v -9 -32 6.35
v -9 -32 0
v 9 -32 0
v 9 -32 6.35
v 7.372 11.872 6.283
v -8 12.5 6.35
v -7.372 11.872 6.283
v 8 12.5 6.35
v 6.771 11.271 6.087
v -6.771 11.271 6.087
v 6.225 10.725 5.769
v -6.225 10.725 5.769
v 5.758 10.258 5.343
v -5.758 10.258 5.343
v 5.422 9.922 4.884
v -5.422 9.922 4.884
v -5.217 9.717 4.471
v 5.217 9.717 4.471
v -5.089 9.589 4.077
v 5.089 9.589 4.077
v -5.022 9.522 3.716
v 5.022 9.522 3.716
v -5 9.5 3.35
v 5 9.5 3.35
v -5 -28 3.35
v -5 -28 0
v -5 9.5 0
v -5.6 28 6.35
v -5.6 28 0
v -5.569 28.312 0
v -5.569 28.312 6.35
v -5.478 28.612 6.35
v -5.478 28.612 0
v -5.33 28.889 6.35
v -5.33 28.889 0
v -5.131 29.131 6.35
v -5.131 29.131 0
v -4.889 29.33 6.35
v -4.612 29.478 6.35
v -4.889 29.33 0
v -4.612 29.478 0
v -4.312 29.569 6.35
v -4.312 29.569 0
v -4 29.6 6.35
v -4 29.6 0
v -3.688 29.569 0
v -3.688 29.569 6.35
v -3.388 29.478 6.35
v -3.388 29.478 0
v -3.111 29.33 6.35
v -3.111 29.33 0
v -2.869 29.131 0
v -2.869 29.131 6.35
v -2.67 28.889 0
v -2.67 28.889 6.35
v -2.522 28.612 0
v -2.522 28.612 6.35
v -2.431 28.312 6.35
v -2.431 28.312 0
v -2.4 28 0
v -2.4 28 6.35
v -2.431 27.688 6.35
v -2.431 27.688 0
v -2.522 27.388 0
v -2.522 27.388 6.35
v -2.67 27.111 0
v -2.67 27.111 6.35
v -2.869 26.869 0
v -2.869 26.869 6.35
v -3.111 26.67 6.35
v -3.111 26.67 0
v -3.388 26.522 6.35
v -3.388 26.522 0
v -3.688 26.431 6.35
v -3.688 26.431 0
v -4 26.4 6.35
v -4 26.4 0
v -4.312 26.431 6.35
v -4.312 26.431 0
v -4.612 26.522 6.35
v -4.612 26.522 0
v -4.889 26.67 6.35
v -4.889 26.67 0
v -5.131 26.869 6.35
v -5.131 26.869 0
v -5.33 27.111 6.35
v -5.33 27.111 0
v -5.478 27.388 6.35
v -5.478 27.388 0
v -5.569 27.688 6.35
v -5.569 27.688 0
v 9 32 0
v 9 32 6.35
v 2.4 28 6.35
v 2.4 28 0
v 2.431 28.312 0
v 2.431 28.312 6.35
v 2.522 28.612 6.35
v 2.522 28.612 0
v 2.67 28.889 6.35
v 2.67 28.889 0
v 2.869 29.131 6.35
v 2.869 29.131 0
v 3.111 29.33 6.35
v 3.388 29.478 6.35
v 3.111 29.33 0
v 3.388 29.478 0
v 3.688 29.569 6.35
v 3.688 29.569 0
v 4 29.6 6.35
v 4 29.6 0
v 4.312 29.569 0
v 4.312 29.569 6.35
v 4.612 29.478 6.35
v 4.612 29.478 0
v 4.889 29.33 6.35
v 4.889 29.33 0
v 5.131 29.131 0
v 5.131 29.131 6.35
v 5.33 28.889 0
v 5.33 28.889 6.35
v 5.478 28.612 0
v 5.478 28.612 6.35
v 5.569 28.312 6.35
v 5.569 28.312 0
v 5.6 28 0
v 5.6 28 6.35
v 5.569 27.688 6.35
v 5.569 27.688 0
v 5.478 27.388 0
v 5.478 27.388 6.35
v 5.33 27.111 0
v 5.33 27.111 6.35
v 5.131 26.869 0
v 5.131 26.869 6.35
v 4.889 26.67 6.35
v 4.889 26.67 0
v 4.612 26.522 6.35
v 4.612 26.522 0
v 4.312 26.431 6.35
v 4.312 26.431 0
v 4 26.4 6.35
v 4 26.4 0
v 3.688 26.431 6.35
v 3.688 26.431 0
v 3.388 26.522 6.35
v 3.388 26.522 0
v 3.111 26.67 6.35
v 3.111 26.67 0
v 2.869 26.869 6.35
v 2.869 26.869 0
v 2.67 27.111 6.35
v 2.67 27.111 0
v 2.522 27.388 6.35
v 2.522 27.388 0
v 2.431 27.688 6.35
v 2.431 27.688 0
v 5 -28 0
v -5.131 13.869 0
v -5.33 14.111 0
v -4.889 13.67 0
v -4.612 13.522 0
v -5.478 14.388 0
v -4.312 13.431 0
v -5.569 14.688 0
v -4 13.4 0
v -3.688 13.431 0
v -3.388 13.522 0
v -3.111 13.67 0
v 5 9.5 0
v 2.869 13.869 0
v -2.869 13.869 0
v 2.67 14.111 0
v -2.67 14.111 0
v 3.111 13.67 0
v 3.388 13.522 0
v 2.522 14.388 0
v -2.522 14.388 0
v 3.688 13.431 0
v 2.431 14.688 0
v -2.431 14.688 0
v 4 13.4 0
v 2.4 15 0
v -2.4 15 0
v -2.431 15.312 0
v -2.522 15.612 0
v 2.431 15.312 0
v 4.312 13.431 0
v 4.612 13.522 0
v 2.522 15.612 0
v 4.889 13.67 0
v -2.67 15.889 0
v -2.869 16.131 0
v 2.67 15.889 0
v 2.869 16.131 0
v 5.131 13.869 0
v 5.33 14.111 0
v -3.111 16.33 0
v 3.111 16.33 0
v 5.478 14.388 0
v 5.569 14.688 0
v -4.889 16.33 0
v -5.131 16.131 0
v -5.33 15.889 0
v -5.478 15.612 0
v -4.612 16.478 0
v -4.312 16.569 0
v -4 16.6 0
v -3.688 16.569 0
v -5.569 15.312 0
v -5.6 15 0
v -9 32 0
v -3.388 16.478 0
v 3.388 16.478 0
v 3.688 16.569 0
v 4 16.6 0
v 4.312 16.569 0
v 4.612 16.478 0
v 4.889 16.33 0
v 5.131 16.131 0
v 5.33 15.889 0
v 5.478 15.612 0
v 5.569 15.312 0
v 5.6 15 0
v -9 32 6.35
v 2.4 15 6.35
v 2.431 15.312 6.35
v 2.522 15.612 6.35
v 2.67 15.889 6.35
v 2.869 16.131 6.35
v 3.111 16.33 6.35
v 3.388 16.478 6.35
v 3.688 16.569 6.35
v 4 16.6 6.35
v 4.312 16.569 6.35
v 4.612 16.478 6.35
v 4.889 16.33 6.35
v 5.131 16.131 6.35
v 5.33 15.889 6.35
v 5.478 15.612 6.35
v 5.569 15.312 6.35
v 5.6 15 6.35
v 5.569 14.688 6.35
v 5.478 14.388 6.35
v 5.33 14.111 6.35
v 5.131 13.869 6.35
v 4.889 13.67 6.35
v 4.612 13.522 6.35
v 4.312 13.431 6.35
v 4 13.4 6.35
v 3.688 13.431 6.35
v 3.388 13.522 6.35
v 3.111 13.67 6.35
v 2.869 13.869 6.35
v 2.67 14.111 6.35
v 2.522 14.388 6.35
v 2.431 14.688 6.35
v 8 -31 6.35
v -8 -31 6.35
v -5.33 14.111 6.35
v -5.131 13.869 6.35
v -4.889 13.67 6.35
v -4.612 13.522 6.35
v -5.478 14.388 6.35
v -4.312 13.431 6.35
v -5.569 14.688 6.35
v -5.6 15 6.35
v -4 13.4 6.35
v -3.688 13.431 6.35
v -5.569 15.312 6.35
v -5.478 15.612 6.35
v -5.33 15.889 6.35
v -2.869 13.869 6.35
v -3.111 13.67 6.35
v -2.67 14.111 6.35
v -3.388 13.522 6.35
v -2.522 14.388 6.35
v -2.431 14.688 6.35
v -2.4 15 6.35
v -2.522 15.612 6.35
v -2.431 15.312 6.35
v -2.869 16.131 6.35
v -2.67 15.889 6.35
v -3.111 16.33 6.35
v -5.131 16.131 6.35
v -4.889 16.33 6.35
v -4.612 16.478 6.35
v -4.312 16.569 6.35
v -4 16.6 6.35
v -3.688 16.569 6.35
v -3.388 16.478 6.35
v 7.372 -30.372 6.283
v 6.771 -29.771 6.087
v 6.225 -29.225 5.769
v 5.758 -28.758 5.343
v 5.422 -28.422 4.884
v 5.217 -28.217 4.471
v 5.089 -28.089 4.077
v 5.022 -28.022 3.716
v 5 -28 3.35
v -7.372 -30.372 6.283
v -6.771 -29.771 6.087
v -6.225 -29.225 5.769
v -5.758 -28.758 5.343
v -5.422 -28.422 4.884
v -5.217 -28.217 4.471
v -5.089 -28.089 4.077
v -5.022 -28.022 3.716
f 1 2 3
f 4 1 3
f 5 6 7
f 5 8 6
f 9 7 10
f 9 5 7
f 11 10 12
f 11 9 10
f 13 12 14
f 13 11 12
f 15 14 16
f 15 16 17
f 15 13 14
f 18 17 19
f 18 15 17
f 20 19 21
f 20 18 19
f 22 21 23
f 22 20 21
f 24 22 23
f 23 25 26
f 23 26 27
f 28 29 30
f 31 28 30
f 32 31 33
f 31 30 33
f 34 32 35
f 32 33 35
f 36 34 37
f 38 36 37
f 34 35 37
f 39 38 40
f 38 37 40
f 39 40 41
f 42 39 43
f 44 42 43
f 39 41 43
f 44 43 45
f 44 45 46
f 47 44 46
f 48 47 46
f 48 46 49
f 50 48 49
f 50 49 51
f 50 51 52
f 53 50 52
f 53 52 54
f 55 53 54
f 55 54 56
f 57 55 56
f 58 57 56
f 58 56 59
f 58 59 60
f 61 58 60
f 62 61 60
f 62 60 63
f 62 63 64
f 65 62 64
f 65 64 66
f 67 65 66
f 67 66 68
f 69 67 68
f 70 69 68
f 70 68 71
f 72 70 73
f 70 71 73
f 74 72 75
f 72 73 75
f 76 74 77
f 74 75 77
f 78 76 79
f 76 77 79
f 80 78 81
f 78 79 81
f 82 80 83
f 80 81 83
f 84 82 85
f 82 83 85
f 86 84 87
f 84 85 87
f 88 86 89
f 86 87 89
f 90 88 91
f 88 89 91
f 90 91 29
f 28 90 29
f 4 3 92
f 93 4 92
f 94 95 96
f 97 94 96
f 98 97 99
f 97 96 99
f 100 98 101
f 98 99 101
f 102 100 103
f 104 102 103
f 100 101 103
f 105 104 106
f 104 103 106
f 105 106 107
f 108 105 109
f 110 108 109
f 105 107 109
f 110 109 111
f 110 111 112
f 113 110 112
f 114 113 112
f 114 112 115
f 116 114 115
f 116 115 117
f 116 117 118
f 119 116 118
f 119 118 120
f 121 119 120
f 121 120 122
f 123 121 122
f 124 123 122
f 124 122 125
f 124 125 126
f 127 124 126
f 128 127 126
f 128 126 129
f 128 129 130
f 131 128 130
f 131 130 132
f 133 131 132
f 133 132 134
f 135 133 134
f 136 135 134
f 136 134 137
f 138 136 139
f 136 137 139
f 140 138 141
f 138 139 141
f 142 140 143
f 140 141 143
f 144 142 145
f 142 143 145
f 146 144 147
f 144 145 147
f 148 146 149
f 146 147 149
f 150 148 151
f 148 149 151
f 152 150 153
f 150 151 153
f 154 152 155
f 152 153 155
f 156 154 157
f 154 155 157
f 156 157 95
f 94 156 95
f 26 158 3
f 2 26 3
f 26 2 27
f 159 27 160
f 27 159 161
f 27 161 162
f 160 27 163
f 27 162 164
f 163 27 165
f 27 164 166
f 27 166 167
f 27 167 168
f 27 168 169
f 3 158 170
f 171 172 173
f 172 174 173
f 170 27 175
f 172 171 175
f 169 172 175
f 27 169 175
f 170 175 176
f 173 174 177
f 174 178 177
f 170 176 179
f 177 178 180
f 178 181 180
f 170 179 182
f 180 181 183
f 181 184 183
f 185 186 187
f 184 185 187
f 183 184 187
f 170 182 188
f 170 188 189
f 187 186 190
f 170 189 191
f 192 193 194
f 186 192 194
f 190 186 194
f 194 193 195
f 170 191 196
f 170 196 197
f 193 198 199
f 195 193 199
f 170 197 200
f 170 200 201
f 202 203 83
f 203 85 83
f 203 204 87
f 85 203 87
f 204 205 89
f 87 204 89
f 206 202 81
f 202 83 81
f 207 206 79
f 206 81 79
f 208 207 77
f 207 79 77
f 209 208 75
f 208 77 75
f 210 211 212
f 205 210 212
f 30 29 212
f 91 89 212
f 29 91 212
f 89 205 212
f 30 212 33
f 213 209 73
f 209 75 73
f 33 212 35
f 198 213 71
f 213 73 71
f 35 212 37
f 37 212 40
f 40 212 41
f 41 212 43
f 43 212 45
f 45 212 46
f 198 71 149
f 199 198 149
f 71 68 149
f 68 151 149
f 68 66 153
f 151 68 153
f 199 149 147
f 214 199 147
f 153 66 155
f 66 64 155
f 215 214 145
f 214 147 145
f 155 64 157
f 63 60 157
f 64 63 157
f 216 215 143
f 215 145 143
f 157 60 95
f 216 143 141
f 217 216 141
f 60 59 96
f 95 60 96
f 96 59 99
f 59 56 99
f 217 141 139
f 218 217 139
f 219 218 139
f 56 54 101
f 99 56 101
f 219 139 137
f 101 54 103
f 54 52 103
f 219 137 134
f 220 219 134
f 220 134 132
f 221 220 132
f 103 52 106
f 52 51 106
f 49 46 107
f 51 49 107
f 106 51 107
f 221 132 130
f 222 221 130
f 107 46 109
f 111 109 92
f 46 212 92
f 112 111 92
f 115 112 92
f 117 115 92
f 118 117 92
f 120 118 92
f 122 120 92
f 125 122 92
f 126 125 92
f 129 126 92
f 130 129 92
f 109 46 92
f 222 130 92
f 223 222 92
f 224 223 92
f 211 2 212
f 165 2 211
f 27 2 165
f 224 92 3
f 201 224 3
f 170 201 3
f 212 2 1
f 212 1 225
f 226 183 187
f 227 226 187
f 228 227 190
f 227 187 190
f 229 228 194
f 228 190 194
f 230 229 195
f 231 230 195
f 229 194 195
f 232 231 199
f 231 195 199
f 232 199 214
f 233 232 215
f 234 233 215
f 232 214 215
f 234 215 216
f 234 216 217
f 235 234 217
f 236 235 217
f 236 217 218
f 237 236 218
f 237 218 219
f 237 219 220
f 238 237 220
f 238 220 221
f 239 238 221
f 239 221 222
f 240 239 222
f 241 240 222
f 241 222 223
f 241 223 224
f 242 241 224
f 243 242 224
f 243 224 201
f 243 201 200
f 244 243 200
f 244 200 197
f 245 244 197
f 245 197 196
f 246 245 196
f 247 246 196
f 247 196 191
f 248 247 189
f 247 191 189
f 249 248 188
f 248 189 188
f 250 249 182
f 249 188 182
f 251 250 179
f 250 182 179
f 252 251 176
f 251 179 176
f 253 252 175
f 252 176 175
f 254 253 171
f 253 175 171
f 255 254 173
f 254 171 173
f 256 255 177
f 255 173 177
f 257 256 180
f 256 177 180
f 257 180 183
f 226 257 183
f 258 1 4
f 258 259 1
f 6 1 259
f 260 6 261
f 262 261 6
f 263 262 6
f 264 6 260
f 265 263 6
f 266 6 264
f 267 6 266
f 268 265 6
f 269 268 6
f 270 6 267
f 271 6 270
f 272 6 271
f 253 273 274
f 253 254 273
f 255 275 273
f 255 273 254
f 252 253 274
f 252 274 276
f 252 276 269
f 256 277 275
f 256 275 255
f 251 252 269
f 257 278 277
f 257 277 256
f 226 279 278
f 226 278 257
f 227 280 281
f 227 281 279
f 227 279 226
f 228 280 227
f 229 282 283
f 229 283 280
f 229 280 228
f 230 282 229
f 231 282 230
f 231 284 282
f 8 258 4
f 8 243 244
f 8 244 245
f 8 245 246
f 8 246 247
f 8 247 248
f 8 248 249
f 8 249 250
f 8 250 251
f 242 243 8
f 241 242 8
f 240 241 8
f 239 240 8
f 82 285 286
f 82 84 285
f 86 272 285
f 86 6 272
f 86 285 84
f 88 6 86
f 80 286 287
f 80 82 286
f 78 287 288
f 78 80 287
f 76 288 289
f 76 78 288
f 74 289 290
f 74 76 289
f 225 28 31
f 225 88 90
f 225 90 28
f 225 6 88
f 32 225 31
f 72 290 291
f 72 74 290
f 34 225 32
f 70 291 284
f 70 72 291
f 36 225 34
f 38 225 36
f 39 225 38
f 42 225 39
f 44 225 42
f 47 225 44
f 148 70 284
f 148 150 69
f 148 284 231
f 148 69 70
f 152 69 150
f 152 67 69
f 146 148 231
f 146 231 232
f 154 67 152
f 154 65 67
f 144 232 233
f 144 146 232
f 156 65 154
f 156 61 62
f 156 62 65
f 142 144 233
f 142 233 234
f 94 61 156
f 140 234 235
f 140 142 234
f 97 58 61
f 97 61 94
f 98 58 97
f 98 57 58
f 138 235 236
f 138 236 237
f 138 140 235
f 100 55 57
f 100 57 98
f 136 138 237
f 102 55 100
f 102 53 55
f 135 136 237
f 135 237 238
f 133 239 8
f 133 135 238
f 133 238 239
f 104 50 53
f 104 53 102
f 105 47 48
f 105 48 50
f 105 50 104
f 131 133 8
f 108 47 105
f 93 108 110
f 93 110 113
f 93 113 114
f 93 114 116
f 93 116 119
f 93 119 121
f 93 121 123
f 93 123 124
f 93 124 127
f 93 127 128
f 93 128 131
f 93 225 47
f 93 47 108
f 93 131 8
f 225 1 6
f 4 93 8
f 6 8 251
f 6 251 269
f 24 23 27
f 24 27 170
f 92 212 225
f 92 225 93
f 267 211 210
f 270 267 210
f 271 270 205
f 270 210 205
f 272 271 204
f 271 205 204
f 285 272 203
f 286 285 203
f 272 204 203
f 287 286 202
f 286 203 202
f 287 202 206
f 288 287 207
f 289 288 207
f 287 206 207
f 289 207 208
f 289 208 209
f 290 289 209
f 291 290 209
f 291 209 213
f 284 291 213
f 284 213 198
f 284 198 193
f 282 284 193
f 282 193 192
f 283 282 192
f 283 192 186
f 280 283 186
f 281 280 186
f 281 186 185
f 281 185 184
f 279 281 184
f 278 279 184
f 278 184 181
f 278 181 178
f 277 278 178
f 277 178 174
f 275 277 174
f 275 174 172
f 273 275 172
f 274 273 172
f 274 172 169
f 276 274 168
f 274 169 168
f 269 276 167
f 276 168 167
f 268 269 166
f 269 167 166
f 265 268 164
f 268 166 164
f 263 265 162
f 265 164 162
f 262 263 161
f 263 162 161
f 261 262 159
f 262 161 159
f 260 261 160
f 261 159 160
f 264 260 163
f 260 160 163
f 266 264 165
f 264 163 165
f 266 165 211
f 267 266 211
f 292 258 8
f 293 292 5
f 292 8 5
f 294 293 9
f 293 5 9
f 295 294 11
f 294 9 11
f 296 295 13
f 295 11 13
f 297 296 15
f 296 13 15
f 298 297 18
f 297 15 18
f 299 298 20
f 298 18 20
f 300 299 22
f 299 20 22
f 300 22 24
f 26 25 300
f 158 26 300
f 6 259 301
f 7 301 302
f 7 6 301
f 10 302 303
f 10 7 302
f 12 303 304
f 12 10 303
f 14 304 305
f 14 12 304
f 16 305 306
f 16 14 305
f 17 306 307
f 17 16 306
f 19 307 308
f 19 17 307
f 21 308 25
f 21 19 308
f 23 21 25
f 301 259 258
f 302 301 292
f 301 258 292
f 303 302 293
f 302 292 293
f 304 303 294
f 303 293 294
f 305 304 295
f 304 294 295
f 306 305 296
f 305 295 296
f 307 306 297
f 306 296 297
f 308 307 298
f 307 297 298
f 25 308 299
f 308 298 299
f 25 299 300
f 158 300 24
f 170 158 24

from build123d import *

# Parameters (mm, degrees)
SKETCH1_W                = 18
SKETCH1_H                = 64
BOSS_EXTRUDE1_DEPTH      = 6.35
M3_CLEARANCE_HOLE1_D     = 3.2
M3_CLEARANCE_HOLE1_DEPTH = 7.5
M3_CLEARANCE_HOLE1_TIP   = 0.96137699
SKETCH4_W                = 10
SKETCH4_H                = 37.5
CUT_EXTRUDE1_DEPTH       = 7.35
FILLET1_R                = 3


with BuildPart() as part:
    # Sketch1 → Boss-Extrude1 (new body)
    with BuildSketch(Plane.XY):
        Rectangle(SKETCH1_W, SKETCH1_H)
    extrude(amount=BOSS_EXTRUDE1_DEPTH)

    # M3 Clearance Hole1
    with Locations(Plane(origin=(-4, 15, 6.35), x_dir=(1, 0, 0), z_dir=(0, 0, 1))):
        with Locations((0, 0), (0, 13), (8, 13), (8, 0)):
            Hole(M3_CLEARANCE_HOLE1_D / 2, depth=M3_CLEARANCE_HOLE1_DEPTH)
            with Locations((0, 0, -(M3_CLEARANCE_HOLE1_DEPTH + M3_CLEARANCE_HOLE1_TIP / 2))):  # 118° drill point
                Cone(0, M3_CLEARANCE_HOLE1_D / 2, M3_CLEARANCE_HOLE1_TIP, mode=Mode.SUBTRACT)

    # Sketch4 → Cut-Extrude1 (cut, through all)
    with BuildSketch(Plane.XY.offset(6.35)):
        with Locations((0, -9.25)):
            Rectangle(SKETCH4_W, SKETCH4_H)
    extrude(amount=-CUT_EXTRUDE1_DEPTH, mode=Mode.SUBTRACT)

    # Fillet1
    fillet1_edges = [part.edges().sort_by_distance(p)[0] for p in [
        (5, -9.25, 6.35),
        (0, 9.5, 6.35),
        (-5, -9.25, 6.35),
        (0, -28, 6.35),
    ]]
    fillet(fillet1_edges, radius=FILLET1_R)


solid = part.part
